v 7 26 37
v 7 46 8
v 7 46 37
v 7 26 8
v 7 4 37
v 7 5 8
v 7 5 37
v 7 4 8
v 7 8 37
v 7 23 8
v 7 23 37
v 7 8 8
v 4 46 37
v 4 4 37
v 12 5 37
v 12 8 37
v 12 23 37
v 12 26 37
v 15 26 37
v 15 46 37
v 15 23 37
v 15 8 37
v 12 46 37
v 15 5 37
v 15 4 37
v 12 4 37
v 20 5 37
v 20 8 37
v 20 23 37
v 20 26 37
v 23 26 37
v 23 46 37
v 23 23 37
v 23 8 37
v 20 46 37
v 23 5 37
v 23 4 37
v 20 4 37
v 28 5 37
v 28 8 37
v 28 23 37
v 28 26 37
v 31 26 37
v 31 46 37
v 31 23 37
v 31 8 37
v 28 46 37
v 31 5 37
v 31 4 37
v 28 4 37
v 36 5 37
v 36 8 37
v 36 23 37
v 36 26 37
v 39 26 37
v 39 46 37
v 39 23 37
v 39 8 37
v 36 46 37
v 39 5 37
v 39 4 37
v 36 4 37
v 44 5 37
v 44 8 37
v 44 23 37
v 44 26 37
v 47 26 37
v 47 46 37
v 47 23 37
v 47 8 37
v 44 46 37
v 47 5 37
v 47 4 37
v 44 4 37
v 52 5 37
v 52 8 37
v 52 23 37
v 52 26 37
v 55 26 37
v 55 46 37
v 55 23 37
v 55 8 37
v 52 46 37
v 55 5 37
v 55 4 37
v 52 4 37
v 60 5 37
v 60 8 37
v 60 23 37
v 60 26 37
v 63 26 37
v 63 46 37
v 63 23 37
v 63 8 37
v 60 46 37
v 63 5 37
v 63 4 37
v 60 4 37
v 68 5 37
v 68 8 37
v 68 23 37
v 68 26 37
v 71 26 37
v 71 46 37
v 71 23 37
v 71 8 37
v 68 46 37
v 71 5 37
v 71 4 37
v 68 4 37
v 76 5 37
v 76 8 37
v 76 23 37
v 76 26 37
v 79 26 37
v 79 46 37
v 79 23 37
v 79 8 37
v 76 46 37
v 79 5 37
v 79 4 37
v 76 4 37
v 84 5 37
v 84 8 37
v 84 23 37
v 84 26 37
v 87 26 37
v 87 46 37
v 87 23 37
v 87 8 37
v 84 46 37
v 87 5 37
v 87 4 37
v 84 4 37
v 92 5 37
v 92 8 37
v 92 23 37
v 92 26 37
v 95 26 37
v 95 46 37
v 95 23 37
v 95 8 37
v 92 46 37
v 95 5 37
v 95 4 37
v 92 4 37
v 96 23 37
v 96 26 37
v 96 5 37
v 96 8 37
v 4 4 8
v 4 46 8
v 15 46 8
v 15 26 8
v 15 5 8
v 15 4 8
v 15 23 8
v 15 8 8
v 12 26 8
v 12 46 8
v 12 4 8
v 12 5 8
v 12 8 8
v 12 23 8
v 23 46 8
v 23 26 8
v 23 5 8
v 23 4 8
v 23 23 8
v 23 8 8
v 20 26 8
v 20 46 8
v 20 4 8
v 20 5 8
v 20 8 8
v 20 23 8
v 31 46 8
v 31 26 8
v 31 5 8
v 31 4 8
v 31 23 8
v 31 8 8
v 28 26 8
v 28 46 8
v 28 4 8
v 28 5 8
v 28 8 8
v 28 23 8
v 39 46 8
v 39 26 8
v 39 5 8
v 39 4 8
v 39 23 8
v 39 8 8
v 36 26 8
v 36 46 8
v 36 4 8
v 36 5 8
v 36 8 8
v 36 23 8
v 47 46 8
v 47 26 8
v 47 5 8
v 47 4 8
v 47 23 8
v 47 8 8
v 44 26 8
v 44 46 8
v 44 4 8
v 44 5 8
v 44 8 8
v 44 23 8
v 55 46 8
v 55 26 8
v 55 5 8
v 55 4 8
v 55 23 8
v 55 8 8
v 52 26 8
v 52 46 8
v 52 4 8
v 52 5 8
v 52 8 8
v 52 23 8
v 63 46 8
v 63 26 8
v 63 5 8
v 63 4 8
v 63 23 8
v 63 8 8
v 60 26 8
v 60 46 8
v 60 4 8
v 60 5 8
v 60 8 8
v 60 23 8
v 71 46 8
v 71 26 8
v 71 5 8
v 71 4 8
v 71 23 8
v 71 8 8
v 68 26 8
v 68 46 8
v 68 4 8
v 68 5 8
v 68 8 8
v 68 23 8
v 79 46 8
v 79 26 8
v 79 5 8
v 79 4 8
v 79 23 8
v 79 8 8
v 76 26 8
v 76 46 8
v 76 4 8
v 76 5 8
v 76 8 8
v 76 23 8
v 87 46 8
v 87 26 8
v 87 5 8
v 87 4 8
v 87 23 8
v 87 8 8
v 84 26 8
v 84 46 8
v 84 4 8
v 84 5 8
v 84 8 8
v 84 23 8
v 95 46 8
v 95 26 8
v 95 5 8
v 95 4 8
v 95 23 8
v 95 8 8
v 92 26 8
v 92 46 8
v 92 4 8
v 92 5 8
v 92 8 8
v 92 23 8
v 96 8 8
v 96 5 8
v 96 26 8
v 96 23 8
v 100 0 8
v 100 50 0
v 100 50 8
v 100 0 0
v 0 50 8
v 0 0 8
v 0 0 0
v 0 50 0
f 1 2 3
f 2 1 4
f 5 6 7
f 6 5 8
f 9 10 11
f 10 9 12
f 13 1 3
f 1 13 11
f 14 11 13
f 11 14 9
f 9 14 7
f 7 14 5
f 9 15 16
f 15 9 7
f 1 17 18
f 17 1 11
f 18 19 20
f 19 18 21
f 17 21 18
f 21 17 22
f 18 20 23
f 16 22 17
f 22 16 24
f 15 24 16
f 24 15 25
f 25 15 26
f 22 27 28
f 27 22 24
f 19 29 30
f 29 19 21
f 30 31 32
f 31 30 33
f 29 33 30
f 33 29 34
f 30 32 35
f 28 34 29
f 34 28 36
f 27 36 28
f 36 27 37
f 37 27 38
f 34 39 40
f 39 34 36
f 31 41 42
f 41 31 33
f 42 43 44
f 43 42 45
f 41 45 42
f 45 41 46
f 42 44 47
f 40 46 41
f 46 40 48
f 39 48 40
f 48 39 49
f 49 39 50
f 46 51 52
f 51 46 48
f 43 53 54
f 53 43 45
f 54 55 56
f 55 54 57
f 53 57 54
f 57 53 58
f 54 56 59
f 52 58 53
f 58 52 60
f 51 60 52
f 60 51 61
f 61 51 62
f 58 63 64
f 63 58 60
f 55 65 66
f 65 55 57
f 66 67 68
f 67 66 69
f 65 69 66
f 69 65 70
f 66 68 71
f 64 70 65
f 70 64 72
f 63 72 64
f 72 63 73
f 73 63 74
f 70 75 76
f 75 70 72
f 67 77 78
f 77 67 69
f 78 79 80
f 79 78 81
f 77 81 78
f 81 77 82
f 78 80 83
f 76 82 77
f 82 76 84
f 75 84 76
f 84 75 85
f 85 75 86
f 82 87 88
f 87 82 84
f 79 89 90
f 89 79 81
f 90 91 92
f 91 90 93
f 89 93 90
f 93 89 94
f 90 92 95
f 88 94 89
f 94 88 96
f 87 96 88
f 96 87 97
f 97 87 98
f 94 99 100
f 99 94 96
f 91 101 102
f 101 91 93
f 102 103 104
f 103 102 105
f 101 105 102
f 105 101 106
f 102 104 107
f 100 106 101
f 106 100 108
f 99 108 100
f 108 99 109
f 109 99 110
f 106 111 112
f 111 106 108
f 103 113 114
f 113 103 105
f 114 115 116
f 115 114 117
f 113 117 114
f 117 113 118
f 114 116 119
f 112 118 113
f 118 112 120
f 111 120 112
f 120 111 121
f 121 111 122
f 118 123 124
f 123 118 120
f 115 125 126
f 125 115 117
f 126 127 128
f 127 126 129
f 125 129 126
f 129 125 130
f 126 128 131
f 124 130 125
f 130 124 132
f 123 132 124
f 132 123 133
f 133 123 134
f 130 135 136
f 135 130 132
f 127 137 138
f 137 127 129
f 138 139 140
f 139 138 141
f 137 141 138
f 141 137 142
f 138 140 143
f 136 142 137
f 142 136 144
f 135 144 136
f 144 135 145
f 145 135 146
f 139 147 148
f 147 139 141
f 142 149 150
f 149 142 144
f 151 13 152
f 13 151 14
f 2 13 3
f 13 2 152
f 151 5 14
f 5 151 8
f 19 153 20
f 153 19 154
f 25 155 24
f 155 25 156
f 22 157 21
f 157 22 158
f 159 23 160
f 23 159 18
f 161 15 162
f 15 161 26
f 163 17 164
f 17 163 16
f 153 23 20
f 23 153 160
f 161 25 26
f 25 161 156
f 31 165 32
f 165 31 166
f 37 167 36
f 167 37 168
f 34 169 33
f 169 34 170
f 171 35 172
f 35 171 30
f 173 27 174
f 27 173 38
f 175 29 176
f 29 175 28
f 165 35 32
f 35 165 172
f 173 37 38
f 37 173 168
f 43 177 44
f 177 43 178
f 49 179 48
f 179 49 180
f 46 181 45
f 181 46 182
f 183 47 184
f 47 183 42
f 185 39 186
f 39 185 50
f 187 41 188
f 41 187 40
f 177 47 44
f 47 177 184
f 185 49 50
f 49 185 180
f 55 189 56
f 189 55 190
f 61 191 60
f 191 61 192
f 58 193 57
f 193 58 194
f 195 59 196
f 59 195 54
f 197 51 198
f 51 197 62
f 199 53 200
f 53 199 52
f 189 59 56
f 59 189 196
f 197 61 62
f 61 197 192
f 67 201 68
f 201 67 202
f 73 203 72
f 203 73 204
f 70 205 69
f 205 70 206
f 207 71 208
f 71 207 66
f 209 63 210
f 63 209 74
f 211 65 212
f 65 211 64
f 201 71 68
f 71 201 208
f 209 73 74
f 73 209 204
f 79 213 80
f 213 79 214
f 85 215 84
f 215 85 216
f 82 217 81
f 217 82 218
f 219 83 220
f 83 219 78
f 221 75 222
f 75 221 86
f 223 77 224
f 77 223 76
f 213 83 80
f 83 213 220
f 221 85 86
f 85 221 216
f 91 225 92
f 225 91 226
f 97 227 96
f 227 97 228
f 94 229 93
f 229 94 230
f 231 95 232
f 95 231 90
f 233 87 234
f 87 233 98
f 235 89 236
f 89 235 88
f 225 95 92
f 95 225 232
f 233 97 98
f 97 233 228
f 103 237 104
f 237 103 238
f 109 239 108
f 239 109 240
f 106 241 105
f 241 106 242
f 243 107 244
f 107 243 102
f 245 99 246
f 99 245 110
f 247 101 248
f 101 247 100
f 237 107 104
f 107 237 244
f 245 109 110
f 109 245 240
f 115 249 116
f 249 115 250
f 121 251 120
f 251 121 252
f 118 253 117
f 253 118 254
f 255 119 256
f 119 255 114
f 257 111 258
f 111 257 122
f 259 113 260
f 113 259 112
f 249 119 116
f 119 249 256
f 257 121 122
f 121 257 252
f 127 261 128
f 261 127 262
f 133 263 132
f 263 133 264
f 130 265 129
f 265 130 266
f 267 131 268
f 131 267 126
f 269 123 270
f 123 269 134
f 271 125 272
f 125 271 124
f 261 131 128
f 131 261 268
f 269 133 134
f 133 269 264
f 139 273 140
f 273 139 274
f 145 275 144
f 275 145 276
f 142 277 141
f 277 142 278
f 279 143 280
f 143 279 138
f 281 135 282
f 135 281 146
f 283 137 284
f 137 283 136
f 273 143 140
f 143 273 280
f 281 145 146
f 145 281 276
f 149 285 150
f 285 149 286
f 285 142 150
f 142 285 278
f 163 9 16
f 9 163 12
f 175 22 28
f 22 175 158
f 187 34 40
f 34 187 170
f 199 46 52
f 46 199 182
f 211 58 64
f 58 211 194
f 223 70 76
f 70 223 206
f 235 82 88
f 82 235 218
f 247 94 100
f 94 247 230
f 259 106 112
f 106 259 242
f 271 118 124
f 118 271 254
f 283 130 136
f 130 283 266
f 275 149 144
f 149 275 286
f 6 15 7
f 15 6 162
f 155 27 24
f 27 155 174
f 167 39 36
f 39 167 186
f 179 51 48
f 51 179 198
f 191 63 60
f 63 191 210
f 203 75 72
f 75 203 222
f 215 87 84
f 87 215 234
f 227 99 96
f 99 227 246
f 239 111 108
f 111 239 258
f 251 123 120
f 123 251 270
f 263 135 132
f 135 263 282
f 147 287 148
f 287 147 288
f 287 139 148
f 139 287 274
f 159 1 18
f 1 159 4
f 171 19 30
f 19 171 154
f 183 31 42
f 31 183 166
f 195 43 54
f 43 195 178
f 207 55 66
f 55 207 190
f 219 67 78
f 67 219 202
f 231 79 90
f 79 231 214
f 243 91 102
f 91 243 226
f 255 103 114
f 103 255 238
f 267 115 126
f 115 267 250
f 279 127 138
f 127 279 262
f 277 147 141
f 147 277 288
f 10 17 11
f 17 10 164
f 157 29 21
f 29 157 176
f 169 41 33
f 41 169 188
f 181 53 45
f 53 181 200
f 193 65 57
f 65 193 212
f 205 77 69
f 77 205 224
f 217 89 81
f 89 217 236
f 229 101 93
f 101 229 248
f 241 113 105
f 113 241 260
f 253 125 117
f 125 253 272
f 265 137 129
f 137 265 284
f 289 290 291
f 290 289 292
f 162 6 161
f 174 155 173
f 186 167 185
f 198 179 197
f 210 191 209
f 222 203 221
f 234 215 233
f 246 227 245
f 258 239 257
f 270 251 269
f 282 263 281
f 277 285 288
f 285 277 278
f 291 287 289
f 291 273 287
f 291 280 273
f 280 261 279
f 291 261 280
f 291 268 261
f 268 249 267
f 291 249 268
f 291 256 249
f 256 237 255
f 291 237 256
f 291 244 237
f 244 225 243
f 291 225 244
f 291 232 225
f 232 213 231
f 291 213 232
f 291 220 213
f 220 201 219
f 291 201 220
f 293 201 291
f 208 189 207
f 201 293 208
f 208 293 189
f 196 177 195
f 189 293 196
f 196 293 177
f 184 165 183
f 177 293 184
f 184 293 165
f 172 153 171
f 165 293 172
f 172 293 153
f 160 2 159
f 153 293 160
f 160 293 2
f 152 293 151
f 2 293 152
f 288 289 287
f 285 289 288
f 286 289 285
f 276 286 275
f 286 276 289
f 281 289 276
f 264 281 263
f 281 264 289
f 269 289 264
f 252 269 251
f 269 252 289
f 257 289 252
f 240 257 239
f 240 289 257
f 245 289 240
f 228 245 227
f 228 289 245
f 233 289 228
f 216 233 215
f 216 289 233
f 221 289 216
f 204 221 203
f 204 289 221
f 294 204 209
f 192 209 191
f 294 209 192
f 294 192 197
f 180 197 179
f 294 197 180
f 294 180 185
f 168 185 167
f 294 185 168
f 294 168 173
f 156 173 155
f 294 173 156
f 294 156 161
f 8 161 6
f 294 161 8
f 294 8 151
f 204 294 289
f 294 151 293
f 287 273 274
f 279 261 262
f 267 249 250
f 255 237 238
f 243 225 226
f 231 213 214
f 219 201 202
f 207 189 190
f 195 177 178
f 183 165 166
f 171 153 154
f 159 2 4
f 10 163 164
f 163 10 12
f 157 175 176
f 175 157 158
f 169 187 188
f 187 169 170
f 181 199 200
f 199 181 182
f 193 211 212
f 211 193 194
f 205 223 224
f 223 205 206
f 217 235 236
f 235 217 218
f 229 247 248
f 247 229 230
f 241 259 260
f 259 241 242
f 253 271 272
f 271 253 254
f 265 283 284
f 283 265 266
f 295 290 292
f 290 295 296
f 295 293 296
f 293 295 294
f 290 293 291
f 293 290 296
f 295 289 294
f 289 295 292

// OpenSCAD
$fn = 32;

// ----------------------------------------------------------------------
// Heatsink: cross fin block
// ----------------------------------------------------------------------

// --- parameters (mm) ---
base_l = 100;             // base length, X
base_w = 50;              // base width, Y
base_t = 8;               // base plate thickness
fin_h = 30;               // fin height above the base
fin_t = 3;                // fin thickness
edge = 4;                 // margin from the base ends
pitch = 8;                // fin pitch
rib_pitch = 18;           // cross rib pitch

n_fins = floor((base_l - 2 * edge - fin_t) / pitch) + 1;  // fin count
total_h = base_t + fin_h - 1;  // overall height
n_ribs = floor((base_w - 2 * edge) / rib_pitch);  // rib count

union() {
  cube([base_l, base_w, base_t]);
  for (i = [0 : n_fins - 1])
    translate([edge + i * pitch, edge, base_t - 1])
      cube([fin_t, base_w - 2 * edge, fin_h]);
  for (i = [0 : n_ribs - 1])
    translate([edge, edge + 1 + i * rib_pitch, base_t - 1])
      cube([base_l - 2 * edge, fin_t, fin_h]);
}
